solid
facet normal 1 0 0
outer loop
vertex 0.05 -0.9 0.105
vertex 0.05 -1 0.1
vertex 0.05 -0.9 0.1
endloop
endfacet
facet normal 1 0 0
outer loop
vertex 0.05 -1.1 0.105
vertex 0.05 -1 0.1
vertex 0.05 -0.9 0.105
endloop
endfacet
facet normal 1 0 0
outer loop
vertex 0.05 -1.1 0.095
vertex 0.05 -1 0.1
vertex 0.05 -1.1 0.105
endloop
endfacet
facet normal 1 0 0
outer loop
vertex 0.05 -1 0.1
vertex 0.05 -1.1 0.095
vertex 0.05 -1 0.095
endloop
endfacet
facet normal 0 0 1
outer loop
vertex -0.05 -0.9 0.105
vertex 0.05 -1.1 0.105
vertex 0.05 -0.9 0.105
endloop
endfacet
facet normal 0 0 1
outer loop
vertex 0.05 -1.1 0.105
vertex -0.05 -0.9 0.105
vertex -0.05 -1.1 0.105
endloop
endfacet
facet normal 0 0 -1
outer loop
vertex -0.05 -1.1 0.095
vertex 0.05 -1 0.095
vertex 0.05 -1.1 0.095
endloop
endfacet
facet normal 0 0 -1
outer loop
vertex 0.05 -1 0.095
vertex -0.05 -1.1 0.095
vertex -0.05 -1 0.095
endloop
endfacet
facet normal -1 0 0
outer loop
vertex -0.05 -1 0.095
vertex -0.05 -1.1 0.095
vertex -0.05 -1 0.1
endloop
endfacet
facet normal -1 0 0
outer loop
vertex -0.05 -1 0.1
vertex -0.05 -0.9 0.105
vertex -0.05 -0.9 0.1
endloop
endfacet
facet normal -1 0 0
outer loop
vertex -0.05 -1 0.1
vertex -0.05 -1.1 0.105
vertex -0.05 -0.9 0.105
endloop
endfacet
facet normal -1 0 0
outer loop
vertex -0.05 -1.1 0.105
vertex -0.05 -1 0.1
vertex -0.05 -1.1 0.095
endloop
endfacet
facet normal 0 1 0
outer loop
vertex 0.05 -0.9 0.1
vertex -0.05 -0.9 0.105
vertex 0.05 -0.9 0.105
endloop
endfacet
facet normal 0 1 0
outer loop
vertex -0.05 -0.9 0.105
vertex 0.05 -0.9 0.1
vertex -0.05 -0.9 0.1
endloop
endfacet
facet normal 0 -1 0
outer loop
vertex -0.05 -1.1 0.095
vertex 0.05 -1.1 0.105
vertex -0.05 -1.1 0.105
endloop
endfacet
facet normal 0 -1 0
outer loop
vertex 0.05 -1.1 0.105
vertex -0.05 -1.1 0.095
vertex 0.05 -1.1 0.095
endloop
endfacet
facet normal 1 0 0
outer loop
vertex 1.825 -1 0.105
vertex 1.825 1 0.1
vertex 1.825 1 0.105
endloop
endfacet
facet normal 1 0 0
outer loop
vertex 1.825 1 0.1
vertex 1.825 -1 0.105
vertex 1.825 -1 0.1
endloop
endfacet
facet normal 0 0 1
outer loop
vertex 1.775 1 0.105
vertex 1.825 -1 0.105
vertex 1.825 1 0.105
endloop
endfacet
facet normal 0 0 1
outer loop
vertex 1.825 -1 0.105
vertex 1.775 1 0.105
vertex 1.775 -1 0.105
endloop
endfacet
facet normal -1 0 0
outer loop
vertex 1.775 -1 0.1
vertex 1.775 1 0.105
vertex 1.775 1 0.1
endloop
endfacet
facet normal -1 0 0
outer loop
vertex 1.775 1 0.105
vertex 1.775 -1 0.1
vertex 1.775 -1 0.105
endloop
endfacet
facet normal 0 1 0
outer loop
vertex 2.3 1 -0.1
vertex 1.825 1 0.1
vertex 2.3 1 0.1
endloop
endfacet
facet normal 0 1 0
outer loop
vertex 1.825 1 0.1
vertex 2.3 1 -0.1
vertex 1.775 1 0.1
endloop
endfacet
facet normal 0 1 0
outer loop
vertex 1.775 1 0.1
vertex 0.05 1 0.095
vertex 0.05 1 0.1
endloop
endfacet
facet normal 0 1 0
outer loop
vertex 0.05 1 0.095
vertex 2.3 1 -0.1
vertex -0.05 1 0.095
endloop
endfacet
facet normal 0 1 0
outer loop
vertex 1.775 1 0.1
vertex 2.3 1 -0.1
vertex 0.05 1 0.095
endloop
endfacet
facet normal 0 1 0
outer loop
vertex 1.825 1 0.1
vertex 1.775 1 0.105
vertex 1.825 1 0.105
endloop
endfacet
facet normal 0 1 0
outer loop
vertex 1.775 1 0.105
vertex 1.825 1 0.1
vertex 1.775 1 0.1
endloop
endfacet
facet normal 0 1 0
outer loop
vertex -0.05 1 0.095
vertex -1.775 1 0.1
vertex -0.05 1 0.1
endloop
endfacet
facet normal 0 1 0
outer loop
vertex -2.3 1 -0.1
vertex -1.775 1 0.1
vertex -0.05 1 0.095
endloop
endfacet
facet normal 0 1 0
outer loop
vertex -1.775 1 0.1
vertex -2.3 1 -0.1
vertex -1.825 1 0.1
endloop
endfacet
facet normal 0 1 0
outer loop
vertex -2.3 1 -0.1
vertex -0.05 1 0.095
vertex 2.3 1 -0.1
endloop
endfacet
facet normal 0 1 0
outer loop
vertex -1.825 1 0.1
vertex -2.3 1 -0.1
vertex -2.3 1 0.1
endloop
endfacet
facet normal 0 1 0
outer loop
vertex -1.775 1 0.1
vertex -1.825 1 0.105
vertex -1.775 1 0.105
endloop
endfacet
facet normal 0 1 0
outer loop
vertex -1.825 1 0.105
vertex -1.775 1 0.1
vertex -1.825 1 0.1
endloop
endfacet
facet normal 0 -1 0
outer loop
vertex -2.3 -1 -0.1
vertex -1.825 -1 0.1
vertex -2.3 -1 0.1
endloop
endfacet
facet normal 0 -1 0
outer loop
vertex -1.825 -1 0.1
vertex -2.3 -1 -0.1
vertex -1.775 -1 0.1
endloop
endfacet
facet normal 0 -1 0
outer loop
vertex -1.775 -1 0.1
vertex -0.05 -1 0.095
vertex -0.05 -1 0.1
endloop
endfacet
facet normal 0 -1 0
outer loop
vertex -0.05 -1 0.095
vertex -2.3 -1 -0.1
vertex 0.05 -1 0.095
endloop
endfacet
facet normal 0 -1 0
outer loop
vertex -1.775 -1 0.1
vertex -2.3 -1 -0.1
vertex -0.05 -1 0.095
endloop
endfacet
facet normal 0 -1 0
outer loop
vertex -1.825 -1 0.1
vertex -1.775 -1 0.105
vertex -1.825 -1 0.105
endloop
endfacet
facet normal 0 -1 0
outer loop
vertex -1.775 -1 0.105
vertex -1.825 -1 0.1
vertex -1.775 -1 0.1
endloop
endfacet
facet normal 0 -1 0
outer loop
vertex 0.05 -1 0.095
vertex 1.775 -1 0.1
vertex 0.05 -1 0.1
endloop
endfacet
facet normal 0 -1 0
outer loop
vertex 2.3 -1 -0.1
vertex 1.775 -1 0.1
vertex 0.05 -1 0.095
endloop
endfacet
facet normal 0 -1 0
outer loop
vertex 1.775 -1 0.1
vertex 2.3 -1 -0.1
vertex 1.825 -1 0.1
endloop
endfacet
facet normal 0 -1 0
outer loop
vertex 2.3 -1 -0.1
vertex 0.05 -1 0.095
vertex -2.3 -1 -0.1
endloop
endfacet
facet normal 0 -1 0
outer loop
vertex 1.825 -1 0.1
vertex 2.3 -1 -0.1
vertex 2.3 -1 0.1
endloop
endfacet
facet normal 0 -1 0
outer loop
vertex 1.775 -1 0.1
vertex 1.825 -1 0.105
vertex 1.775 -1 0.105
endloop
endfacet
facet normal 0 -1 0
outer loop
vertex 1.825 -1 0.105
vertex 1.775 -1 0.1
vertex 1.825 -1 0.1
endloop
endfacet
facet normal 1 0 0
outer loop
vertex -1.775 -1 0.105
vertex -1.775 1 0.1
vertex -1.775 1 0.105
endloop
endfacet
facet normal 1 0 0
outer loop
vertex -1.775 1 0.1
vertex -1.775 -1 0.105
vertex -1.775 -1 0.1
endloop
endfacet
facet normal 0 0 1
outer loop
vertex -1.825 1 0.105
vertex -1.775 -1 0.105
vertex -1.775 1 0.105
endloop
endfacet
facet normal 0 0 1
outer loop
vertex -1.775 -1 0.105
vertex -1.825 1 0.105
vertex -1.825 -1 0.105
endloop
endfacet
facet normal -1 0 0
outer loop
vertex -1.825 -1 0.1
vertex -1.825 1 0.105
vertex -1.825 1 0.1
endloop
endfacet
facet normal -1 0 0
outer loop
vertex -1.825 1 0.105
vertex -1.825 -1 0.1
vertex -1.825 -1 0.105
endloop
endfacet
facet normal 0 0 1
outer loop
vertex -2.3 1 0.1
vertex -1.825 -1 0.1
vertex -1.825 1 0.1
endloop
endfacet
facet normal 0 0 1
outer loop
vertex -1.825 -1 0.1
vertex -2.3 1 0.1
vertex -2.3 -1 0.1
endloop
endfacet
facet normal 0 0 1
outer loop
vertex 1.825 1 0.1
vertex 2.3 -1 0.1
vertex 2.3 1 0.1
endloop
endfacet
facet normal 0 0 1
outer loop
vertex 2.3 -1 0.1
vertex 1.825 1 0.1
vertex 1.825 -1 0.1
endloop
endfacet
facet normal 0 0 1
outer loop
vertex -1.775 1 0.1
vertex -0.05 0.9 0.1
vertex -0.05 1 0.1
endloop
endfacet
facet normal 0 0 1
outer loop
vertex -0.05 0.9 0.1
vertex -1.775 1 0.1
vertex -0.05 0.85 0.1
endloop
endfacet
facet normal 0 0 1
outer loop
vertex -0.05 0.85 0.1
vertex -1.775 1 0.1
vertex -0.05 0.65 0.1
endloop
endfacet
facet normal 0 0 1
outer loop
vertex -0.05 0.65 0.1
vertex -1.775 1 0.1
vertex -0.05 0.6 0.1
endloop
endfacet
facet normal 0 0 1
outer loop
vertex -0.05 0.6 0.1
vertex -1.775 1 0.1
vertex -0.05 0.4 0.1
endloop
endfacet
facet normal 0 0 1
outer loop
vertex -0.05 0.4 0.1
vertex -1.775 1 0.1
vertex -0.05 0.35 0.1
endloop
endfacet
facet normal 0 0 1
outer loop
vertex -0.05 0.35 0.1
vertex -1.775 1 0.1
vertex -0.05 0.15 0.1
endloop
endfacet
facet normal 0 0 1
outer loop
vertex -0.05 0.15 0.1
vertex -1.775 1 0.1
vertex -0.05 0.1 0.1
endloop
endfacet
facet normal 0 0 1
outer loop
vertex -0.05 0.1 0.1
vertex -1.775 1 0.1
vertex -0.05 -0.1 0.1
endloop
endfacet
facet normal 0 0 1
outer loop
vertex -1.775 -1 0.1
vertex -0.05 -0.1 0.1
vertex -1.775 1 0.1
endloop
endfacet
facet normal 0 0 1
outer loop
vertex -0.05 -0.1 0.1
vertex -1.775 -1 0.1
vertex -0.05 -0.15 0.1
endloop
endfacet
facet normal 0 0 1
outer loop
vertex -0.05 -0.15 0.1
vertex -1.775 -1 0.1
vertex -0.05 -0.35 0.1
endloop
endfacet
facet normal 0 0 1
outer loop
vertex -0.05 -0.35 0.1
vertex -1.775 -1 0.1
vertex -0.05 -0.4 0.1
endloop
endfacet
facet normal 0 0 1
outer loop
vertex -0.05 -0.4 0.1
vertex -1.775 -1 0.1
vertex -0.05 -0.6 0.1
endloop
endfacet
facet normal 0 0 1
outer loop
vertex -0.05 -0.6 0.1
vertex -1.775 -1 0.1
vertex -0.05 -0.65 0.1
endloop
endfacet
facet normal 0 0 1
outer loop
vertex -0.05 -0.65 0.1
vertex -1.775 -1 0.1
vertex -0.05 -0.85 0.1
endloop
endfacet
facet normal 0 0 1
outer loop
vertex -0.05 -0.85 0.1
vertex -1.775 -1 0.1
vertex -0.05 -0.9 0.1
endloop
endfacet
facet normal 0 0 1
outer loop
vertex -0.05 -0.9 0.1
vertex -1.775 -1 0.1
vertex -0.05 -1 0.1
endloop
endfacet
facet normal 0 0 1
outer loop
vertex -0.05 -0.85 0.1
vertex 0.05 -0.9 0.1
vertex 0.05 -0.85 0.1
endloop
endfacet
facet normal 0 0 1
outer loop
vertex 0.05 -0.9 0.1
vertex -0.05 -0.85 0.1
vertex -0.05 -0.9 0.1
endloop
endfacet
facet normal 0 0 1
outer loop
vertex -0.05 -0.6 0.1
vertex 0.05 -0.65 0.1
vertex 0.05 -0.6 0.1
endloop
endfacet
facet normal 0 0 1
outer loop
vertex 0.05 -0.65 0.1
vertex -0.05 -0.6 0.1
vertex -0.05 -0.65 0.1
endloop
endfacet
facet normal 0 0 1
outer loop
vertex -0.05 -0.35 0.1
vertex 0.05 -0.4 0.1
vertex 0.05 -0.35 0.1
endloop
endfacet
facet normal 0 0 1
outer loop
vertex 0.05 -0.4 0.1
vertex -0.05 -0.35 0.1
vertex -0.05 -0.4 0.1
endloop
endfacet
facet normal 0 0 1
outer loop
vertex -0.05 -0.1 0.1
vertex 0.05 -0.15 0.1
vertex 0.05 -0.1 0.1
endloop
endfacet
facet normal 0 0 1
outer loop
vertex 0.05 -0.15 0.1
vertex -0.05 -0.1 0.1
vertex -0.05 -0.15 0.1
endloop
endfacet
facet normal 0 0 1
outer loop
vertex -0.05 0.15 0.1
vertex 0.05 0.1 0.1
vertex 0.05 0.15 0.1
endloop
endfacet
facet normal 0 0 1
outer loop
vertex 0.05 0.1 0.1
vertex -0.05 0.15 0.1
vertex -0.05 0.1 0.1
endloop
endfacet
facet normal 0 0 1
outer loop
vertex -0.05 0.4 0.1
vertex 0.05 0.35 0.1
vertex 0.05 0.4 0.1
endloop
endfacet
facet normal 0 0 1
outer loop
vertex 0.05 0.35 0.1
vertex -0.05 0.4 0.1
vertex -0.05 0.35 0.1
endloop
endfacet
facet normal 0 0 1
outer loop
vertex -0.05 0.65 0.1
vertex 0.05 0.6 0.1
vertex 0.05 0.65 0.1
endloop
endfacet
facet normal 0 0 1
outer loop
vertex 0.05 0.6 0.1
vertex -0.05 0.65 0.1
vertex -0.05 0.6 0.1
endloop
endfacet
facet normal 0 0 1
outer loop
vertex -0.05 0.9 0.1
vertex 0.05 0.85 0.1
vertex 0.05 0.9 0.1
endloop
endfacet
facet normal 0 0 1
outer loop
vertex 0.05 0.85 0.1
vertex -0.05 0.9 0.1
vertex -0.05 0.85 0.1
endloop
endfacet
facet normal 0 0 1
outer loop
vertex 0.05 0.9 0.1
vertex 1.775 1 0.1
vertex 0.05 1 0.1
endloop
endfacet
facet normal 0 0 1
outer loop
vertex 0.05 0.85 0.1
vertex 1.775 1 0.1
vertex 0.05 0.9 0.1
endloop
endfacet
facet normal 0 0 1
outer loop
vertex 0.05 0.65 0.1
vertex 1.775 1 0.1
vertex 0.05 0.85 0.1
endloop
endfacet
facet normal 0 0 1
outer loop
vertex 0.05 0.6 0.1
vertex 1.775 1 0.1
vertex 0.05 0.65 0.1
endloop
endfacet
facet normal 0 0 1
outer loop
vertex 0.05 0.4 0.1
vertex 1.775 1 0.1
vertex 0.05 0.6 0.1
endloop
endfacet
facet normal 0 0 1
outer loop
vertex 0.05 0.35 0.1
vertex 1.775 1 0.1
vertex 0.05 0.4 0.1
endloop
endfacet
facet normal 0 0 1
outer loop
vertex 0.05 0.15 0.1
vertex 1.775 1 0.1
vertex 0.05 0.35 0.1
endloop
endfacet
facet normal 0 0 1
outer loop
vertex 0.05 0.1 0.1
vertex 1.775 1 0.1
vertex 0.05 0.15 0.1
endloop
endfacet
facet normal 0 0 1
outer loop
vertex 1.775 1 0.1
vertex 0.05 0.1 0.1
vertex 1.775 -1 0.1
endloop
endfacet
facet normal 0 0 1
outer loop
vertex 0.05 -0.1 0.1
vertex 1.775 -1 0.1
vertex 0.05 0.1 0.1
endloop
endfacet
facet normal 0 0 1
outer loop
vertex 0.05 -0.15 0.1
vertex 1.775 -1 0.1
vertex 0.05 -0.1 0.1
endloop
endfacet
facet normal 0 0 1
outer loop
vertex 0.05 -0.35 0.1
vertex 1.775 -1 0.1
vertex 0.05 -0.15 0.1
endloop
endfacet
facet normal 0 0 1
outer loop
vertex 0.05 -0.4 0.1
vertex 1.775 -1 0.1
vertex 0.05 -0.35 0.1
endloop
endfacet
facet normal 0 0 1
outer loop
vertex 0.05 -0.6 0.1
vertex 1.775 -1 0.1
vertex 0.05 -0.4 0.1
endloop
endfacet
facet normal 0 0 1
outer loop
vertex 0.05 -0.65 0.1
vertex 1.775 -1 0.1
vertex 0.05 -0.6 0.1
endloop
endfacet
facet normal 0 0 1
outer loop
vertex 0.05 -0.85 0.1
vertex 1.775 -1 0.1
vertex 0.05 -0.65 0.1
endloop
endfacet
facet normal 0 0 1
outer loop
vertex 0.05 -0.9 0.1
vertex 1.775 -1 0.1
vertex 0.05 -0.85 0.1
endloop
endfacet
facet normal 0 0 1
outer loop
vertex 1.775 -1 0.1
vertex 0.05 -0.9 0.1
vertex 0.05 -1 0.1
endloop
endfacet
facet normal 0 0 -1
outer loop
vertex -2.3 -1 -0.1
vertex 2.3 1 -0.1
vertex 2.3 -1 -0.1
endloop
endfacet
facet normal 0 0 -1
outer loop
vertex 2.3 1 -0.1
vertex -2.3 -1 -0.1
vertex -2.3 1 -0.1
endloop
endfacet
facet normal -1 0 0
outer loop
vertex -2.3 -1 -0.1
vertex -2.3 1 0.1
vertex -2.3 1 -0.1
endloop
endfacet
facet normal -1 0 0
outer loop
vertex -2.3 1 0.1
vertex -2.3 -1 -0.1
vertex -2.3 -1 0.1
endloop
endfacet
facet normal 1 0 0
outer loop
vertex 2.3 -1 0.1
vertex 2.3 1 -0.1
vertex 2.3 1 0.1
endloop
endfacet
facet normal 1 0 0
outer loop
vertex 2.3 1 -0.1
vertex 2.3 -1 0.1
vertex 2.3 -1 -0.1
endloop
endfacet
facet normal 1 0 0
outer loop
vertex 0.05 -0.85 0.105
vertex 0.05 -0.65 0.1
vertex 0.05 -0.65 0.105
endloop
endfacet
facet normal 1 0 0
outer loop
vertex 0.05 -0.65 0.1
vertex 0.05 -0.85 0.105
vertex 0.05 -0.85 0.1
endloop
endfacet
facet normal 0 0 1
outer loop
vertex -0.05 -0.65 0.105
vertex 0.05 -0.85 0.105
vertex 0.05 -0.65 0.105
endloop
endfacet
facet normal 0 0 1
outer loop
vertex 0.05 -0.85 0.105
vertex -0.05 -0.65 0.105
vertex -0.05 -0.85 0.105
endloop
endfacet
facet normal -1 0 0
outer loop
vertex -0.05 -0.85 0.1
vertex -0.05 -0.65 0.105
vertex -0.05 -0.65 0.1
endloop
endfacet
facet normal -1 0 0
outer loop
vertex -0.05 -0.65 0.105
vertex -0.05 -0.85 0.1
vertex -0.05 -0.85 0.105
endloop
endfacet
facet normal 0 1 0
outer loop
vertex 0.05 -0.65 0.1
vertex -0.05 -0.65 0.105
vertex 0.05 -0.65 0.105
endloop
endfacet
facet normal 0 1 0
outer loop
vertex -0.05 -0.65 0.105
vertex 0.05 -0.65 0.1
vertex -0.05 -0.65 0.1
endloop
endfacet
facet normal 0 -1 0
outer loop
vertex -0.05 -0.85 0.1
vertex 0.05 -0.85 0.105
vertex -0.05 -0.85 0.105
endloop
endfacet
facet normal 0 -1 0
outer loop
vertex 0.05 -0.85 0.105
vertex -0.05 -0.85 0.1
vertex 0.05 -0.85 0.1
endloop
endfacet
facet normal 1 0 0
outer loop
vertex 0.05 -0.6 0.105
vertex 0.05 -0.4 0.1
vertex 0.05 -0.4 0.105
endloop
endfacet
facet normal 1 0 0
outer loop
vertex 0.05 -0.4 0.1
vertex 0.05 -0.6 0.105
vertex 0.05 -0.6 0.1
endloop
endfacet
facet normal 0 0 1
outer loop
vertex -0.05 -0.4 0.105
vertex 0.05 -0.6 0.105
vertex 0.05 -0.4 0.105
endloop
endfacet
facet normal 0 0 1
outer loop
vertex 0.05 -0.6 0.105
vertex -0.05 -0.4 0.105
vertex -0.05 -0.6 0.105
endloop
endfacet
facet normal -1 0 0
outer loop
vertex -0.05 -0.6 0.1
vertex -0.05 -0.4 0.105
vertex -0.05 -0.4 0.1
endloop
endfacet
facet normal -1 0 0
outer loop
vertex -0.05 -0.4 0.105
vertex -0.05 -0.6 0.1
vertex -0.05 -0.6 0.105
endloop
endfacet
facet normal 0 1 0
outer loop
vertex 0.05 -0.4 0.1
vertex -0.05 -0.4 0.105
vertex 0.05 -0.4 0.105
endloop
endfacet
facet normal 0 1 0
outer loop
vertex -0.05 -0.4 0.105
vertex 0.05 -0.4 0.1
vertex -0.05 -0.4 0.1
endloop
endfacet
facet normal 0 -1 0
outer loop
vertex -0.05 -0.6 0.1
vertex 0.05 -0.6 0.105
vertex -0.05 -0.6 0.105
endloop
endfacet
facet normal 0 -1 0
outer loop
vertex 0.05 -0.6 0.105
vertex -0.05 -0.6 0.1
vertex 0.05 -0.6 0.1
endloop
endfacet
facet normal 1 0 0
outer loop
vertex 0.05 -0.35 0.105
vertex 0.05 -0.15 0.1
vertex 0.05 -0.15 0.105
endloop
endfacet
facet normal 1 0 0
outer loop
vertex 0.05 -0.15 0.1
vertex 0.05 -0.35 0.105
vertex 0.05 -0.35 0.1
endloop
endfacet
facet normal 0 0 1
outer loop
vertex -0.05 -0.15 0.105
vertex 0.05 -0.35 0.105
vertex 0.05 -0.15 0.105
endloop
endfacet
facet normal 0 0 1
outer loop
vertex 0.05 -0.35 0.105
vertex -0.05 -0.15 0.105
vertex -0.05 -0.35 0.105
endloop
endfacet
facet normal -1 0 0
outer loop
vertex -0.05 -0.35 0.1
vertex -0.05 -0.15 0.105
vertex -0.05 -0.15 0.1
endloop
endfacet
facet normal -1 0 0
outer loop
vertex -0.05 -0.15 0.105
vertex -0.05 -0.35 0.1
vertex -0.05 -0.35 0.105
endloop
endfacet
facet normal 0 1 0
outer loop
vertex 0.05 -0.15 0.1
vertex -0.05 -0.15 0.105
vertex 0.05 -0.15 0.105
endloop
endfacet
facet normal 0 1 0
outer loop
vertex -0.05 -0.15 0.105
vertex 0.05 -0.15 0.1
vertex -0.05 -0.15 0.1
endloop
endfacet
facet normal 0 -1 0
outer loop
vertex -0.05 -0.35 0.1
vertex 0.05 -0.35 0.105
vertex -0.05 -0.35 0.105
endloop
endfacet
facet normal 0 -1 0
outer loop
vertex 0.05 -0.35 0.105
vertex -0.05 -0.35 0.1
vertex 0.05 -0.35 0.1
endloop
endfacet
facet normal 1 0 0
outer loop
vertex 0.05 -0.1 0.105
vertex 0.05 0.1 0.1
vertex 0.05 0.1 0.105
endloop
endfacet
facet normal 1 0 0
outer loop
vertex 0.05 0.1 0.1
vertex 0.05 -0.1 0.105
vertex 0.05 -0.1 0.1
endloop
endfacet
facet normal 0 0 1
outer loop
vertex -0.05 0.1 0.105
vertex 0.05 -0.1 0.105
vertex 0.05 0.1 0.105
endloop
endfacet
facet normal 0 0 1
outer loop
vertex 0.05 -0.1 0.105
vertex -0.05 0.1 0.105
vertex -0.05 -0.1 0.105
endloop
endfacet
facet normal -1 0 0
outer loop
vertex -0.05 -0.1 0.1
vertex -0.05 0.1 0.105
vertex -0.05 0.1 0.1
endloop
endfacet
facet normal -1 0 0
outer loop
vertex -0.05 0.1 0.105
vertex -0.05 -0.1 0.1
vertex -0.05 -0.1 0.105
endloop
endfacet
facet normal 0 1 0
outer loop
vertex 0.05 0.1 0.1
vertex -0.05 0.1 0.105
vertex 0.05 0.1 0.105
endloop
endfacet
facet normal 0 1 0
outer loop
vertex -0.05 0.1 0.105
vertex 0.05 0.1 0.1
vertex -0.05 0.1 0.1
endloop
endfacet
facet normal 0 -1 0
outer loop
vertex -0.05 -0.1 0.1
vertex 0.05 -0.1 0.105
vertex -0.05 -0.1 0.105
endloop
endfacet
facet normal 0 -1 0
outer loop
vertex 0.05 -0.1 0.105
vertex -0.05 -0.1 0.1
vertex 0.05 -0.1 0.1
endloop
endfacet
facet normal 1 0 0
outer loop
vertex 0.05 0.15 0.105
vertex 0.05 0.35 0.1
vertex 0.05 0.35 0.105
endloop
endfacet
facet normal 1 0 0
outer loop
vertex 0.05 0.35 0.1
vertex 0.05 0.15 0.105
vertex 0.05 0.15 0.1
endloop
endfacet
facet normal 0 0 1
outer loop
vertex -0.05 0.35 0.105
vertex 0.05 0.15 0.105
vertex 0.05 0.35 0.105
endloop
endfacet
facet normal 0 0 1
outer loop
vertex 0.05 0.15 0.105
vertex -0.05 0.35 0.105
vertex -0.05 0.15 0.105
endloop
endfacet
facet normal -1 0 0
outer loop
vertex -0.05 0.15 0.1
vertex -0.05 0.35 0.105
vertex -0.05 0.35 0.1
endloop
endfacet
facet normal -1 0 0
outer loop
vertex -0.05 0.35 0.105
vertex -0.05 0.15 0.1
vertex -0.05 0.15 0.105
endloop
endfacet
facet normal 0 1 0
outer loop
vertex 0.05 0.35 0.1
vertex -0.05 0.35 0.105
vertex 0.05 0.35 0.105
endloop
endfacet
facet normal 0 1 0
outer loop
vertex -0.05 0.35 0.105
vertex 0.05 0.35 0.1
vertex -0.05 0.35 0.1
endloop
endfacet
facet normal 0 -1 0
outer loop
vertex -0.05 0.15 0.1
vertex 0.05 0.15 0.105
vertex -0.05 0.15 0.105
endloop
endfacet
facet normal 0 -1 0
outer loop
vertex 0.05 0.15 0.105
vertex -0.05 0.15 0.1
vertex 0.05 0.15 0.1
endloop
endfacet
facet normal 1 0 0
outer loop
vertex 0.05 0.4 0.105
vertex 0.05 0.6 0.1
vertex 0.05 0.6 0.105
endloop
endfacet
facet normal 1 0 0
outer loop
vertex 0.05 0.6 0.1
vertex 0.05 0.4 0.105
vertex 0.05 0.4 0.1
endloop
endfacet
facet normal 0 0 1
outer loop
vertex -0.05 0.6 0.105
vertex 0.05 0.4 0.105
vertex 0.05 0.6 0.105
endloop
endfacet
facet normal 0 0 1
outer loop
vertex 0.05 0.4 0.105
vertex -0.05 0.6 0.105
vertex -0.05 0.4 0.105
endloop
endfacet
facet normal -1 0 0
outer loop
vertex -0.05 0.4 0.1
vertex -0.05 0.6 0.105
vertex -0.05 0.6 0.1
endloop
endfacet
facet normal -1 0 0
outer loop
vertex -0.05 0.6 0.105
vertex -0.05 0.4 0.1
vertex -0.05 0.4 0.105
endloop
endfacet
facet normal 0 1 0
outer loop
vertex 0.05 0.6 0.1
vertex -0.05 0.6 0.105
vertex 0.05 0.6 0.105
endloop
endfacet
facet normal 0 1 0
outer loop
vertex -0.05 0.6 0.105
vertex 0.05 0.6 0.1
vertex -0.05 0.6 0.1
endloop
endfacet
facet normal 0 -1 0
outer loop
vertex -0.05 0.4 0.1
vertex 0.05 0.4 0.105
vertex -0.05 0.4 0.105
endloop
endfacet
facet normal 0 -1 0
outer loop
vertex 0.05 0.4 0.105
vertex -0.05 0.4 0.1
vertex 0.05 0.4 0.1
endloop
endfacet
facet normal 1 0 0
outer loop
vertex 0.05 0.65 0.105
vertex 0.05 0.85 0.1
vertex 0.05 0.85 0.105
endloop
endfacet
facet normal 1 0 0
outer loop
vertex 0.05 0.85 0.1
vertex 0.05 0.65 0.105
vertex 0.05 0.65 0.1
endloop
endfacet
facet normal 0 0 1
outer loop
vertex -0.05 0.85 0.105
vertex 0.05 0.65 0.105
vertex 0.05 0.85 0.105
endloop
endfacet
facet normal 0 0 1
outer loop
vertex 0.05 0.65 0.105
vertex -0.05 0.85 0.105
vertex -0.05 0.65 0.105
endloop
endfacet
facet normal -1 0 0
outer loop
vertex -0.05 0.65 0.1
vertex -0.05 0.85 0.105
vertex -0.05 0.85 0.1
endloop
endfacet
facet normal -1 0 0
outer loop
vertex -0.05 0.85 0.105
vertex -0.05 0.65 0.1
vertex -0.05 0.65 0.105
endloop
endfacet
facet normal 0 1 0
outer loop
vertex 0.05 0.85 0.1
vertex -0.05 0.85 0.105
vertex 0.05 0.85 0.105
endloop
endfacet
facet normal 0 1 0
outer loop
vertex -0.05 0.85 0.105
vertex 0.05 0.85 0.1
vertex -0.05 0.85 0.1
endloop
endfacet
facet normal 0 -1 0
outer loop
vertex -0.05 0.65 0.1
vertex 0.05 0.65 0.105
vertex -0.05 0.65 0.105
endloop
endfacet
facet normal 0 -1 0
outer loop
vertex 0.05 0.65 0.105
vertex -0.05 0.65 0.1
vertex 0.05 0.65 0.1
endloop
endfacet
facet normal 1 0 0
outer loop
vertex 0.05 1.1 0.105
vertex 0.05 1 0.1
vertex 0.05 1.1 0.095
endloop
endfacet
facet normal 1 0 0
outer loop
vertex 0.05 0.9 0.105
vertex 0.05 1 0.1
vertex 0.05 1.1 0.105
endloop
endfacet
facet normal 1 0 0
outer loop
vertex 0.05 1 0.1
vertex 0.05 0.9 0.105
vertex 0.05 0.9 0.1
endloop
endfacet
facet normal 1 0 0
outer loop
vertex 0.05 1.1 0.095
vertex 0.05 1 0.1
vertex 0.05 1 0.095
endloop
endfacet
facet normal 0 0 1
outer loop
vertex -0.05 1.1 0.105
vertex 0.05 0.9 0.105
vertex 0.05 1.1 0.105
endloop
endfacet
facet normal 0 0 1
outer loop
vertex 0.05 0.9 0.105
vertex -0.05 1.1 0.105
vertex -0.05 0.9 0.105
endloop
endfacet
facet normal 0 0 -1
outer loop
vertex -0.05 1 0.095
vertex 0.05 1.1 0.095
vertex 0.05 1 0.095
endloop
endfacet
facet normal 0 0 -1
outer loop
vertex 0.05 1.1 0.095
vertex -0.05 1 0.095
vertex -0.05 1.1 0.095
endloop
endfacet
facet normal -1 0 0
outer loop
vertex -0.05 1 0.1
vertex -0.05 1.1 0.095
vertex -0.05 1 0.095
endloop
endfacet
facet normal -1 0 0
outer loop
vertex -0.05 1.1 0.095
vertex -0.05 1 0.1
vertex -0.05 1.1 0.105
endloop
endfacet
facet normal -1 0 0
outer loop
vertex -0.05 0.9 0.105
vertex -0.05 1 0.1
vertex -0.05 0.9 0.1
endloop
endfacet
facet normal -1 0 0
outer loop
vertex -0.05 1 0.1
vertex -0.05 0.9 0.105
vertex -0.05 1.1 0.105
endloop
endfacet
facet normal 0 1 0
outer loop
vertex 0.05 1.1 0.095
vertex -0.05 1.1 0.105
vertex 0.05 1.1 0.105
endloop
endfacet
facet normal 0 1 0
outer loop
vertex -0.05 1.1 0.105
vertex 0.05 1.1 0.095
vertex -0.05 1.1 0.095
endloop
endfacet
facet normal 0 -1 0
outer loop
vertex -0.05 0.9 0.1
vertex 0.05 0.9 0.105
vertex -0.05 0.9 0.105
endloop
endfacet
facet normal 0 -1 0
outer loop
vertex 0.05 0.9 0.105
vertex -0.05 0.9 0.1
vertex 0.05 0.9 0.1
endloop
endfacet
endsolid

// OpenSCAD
module Street_01(col ="#3b4747"){
color(col)
cube([4,2,0.2], center = true);

for (i = [-1:0.25:1] ){

translate([0,i,0.10])
color("white")
cube([0.1,0.2,0.01], center = true);

translate([1.8,0,0.10])
color("white")
cube([0.05,2,0.01], center = true);


translate([-1.8,0,0.10])
color("white")
cube([0.05,2,0.01], center = true);

translate([-2.15,0,0.0])
color("GRAY")
cube([0.3,2,0.2], center = true);

translate([2.15,0,0.0])
color("GRAY")
cube([0.3,2,0.2], center = true);

}
}



Street_01();
